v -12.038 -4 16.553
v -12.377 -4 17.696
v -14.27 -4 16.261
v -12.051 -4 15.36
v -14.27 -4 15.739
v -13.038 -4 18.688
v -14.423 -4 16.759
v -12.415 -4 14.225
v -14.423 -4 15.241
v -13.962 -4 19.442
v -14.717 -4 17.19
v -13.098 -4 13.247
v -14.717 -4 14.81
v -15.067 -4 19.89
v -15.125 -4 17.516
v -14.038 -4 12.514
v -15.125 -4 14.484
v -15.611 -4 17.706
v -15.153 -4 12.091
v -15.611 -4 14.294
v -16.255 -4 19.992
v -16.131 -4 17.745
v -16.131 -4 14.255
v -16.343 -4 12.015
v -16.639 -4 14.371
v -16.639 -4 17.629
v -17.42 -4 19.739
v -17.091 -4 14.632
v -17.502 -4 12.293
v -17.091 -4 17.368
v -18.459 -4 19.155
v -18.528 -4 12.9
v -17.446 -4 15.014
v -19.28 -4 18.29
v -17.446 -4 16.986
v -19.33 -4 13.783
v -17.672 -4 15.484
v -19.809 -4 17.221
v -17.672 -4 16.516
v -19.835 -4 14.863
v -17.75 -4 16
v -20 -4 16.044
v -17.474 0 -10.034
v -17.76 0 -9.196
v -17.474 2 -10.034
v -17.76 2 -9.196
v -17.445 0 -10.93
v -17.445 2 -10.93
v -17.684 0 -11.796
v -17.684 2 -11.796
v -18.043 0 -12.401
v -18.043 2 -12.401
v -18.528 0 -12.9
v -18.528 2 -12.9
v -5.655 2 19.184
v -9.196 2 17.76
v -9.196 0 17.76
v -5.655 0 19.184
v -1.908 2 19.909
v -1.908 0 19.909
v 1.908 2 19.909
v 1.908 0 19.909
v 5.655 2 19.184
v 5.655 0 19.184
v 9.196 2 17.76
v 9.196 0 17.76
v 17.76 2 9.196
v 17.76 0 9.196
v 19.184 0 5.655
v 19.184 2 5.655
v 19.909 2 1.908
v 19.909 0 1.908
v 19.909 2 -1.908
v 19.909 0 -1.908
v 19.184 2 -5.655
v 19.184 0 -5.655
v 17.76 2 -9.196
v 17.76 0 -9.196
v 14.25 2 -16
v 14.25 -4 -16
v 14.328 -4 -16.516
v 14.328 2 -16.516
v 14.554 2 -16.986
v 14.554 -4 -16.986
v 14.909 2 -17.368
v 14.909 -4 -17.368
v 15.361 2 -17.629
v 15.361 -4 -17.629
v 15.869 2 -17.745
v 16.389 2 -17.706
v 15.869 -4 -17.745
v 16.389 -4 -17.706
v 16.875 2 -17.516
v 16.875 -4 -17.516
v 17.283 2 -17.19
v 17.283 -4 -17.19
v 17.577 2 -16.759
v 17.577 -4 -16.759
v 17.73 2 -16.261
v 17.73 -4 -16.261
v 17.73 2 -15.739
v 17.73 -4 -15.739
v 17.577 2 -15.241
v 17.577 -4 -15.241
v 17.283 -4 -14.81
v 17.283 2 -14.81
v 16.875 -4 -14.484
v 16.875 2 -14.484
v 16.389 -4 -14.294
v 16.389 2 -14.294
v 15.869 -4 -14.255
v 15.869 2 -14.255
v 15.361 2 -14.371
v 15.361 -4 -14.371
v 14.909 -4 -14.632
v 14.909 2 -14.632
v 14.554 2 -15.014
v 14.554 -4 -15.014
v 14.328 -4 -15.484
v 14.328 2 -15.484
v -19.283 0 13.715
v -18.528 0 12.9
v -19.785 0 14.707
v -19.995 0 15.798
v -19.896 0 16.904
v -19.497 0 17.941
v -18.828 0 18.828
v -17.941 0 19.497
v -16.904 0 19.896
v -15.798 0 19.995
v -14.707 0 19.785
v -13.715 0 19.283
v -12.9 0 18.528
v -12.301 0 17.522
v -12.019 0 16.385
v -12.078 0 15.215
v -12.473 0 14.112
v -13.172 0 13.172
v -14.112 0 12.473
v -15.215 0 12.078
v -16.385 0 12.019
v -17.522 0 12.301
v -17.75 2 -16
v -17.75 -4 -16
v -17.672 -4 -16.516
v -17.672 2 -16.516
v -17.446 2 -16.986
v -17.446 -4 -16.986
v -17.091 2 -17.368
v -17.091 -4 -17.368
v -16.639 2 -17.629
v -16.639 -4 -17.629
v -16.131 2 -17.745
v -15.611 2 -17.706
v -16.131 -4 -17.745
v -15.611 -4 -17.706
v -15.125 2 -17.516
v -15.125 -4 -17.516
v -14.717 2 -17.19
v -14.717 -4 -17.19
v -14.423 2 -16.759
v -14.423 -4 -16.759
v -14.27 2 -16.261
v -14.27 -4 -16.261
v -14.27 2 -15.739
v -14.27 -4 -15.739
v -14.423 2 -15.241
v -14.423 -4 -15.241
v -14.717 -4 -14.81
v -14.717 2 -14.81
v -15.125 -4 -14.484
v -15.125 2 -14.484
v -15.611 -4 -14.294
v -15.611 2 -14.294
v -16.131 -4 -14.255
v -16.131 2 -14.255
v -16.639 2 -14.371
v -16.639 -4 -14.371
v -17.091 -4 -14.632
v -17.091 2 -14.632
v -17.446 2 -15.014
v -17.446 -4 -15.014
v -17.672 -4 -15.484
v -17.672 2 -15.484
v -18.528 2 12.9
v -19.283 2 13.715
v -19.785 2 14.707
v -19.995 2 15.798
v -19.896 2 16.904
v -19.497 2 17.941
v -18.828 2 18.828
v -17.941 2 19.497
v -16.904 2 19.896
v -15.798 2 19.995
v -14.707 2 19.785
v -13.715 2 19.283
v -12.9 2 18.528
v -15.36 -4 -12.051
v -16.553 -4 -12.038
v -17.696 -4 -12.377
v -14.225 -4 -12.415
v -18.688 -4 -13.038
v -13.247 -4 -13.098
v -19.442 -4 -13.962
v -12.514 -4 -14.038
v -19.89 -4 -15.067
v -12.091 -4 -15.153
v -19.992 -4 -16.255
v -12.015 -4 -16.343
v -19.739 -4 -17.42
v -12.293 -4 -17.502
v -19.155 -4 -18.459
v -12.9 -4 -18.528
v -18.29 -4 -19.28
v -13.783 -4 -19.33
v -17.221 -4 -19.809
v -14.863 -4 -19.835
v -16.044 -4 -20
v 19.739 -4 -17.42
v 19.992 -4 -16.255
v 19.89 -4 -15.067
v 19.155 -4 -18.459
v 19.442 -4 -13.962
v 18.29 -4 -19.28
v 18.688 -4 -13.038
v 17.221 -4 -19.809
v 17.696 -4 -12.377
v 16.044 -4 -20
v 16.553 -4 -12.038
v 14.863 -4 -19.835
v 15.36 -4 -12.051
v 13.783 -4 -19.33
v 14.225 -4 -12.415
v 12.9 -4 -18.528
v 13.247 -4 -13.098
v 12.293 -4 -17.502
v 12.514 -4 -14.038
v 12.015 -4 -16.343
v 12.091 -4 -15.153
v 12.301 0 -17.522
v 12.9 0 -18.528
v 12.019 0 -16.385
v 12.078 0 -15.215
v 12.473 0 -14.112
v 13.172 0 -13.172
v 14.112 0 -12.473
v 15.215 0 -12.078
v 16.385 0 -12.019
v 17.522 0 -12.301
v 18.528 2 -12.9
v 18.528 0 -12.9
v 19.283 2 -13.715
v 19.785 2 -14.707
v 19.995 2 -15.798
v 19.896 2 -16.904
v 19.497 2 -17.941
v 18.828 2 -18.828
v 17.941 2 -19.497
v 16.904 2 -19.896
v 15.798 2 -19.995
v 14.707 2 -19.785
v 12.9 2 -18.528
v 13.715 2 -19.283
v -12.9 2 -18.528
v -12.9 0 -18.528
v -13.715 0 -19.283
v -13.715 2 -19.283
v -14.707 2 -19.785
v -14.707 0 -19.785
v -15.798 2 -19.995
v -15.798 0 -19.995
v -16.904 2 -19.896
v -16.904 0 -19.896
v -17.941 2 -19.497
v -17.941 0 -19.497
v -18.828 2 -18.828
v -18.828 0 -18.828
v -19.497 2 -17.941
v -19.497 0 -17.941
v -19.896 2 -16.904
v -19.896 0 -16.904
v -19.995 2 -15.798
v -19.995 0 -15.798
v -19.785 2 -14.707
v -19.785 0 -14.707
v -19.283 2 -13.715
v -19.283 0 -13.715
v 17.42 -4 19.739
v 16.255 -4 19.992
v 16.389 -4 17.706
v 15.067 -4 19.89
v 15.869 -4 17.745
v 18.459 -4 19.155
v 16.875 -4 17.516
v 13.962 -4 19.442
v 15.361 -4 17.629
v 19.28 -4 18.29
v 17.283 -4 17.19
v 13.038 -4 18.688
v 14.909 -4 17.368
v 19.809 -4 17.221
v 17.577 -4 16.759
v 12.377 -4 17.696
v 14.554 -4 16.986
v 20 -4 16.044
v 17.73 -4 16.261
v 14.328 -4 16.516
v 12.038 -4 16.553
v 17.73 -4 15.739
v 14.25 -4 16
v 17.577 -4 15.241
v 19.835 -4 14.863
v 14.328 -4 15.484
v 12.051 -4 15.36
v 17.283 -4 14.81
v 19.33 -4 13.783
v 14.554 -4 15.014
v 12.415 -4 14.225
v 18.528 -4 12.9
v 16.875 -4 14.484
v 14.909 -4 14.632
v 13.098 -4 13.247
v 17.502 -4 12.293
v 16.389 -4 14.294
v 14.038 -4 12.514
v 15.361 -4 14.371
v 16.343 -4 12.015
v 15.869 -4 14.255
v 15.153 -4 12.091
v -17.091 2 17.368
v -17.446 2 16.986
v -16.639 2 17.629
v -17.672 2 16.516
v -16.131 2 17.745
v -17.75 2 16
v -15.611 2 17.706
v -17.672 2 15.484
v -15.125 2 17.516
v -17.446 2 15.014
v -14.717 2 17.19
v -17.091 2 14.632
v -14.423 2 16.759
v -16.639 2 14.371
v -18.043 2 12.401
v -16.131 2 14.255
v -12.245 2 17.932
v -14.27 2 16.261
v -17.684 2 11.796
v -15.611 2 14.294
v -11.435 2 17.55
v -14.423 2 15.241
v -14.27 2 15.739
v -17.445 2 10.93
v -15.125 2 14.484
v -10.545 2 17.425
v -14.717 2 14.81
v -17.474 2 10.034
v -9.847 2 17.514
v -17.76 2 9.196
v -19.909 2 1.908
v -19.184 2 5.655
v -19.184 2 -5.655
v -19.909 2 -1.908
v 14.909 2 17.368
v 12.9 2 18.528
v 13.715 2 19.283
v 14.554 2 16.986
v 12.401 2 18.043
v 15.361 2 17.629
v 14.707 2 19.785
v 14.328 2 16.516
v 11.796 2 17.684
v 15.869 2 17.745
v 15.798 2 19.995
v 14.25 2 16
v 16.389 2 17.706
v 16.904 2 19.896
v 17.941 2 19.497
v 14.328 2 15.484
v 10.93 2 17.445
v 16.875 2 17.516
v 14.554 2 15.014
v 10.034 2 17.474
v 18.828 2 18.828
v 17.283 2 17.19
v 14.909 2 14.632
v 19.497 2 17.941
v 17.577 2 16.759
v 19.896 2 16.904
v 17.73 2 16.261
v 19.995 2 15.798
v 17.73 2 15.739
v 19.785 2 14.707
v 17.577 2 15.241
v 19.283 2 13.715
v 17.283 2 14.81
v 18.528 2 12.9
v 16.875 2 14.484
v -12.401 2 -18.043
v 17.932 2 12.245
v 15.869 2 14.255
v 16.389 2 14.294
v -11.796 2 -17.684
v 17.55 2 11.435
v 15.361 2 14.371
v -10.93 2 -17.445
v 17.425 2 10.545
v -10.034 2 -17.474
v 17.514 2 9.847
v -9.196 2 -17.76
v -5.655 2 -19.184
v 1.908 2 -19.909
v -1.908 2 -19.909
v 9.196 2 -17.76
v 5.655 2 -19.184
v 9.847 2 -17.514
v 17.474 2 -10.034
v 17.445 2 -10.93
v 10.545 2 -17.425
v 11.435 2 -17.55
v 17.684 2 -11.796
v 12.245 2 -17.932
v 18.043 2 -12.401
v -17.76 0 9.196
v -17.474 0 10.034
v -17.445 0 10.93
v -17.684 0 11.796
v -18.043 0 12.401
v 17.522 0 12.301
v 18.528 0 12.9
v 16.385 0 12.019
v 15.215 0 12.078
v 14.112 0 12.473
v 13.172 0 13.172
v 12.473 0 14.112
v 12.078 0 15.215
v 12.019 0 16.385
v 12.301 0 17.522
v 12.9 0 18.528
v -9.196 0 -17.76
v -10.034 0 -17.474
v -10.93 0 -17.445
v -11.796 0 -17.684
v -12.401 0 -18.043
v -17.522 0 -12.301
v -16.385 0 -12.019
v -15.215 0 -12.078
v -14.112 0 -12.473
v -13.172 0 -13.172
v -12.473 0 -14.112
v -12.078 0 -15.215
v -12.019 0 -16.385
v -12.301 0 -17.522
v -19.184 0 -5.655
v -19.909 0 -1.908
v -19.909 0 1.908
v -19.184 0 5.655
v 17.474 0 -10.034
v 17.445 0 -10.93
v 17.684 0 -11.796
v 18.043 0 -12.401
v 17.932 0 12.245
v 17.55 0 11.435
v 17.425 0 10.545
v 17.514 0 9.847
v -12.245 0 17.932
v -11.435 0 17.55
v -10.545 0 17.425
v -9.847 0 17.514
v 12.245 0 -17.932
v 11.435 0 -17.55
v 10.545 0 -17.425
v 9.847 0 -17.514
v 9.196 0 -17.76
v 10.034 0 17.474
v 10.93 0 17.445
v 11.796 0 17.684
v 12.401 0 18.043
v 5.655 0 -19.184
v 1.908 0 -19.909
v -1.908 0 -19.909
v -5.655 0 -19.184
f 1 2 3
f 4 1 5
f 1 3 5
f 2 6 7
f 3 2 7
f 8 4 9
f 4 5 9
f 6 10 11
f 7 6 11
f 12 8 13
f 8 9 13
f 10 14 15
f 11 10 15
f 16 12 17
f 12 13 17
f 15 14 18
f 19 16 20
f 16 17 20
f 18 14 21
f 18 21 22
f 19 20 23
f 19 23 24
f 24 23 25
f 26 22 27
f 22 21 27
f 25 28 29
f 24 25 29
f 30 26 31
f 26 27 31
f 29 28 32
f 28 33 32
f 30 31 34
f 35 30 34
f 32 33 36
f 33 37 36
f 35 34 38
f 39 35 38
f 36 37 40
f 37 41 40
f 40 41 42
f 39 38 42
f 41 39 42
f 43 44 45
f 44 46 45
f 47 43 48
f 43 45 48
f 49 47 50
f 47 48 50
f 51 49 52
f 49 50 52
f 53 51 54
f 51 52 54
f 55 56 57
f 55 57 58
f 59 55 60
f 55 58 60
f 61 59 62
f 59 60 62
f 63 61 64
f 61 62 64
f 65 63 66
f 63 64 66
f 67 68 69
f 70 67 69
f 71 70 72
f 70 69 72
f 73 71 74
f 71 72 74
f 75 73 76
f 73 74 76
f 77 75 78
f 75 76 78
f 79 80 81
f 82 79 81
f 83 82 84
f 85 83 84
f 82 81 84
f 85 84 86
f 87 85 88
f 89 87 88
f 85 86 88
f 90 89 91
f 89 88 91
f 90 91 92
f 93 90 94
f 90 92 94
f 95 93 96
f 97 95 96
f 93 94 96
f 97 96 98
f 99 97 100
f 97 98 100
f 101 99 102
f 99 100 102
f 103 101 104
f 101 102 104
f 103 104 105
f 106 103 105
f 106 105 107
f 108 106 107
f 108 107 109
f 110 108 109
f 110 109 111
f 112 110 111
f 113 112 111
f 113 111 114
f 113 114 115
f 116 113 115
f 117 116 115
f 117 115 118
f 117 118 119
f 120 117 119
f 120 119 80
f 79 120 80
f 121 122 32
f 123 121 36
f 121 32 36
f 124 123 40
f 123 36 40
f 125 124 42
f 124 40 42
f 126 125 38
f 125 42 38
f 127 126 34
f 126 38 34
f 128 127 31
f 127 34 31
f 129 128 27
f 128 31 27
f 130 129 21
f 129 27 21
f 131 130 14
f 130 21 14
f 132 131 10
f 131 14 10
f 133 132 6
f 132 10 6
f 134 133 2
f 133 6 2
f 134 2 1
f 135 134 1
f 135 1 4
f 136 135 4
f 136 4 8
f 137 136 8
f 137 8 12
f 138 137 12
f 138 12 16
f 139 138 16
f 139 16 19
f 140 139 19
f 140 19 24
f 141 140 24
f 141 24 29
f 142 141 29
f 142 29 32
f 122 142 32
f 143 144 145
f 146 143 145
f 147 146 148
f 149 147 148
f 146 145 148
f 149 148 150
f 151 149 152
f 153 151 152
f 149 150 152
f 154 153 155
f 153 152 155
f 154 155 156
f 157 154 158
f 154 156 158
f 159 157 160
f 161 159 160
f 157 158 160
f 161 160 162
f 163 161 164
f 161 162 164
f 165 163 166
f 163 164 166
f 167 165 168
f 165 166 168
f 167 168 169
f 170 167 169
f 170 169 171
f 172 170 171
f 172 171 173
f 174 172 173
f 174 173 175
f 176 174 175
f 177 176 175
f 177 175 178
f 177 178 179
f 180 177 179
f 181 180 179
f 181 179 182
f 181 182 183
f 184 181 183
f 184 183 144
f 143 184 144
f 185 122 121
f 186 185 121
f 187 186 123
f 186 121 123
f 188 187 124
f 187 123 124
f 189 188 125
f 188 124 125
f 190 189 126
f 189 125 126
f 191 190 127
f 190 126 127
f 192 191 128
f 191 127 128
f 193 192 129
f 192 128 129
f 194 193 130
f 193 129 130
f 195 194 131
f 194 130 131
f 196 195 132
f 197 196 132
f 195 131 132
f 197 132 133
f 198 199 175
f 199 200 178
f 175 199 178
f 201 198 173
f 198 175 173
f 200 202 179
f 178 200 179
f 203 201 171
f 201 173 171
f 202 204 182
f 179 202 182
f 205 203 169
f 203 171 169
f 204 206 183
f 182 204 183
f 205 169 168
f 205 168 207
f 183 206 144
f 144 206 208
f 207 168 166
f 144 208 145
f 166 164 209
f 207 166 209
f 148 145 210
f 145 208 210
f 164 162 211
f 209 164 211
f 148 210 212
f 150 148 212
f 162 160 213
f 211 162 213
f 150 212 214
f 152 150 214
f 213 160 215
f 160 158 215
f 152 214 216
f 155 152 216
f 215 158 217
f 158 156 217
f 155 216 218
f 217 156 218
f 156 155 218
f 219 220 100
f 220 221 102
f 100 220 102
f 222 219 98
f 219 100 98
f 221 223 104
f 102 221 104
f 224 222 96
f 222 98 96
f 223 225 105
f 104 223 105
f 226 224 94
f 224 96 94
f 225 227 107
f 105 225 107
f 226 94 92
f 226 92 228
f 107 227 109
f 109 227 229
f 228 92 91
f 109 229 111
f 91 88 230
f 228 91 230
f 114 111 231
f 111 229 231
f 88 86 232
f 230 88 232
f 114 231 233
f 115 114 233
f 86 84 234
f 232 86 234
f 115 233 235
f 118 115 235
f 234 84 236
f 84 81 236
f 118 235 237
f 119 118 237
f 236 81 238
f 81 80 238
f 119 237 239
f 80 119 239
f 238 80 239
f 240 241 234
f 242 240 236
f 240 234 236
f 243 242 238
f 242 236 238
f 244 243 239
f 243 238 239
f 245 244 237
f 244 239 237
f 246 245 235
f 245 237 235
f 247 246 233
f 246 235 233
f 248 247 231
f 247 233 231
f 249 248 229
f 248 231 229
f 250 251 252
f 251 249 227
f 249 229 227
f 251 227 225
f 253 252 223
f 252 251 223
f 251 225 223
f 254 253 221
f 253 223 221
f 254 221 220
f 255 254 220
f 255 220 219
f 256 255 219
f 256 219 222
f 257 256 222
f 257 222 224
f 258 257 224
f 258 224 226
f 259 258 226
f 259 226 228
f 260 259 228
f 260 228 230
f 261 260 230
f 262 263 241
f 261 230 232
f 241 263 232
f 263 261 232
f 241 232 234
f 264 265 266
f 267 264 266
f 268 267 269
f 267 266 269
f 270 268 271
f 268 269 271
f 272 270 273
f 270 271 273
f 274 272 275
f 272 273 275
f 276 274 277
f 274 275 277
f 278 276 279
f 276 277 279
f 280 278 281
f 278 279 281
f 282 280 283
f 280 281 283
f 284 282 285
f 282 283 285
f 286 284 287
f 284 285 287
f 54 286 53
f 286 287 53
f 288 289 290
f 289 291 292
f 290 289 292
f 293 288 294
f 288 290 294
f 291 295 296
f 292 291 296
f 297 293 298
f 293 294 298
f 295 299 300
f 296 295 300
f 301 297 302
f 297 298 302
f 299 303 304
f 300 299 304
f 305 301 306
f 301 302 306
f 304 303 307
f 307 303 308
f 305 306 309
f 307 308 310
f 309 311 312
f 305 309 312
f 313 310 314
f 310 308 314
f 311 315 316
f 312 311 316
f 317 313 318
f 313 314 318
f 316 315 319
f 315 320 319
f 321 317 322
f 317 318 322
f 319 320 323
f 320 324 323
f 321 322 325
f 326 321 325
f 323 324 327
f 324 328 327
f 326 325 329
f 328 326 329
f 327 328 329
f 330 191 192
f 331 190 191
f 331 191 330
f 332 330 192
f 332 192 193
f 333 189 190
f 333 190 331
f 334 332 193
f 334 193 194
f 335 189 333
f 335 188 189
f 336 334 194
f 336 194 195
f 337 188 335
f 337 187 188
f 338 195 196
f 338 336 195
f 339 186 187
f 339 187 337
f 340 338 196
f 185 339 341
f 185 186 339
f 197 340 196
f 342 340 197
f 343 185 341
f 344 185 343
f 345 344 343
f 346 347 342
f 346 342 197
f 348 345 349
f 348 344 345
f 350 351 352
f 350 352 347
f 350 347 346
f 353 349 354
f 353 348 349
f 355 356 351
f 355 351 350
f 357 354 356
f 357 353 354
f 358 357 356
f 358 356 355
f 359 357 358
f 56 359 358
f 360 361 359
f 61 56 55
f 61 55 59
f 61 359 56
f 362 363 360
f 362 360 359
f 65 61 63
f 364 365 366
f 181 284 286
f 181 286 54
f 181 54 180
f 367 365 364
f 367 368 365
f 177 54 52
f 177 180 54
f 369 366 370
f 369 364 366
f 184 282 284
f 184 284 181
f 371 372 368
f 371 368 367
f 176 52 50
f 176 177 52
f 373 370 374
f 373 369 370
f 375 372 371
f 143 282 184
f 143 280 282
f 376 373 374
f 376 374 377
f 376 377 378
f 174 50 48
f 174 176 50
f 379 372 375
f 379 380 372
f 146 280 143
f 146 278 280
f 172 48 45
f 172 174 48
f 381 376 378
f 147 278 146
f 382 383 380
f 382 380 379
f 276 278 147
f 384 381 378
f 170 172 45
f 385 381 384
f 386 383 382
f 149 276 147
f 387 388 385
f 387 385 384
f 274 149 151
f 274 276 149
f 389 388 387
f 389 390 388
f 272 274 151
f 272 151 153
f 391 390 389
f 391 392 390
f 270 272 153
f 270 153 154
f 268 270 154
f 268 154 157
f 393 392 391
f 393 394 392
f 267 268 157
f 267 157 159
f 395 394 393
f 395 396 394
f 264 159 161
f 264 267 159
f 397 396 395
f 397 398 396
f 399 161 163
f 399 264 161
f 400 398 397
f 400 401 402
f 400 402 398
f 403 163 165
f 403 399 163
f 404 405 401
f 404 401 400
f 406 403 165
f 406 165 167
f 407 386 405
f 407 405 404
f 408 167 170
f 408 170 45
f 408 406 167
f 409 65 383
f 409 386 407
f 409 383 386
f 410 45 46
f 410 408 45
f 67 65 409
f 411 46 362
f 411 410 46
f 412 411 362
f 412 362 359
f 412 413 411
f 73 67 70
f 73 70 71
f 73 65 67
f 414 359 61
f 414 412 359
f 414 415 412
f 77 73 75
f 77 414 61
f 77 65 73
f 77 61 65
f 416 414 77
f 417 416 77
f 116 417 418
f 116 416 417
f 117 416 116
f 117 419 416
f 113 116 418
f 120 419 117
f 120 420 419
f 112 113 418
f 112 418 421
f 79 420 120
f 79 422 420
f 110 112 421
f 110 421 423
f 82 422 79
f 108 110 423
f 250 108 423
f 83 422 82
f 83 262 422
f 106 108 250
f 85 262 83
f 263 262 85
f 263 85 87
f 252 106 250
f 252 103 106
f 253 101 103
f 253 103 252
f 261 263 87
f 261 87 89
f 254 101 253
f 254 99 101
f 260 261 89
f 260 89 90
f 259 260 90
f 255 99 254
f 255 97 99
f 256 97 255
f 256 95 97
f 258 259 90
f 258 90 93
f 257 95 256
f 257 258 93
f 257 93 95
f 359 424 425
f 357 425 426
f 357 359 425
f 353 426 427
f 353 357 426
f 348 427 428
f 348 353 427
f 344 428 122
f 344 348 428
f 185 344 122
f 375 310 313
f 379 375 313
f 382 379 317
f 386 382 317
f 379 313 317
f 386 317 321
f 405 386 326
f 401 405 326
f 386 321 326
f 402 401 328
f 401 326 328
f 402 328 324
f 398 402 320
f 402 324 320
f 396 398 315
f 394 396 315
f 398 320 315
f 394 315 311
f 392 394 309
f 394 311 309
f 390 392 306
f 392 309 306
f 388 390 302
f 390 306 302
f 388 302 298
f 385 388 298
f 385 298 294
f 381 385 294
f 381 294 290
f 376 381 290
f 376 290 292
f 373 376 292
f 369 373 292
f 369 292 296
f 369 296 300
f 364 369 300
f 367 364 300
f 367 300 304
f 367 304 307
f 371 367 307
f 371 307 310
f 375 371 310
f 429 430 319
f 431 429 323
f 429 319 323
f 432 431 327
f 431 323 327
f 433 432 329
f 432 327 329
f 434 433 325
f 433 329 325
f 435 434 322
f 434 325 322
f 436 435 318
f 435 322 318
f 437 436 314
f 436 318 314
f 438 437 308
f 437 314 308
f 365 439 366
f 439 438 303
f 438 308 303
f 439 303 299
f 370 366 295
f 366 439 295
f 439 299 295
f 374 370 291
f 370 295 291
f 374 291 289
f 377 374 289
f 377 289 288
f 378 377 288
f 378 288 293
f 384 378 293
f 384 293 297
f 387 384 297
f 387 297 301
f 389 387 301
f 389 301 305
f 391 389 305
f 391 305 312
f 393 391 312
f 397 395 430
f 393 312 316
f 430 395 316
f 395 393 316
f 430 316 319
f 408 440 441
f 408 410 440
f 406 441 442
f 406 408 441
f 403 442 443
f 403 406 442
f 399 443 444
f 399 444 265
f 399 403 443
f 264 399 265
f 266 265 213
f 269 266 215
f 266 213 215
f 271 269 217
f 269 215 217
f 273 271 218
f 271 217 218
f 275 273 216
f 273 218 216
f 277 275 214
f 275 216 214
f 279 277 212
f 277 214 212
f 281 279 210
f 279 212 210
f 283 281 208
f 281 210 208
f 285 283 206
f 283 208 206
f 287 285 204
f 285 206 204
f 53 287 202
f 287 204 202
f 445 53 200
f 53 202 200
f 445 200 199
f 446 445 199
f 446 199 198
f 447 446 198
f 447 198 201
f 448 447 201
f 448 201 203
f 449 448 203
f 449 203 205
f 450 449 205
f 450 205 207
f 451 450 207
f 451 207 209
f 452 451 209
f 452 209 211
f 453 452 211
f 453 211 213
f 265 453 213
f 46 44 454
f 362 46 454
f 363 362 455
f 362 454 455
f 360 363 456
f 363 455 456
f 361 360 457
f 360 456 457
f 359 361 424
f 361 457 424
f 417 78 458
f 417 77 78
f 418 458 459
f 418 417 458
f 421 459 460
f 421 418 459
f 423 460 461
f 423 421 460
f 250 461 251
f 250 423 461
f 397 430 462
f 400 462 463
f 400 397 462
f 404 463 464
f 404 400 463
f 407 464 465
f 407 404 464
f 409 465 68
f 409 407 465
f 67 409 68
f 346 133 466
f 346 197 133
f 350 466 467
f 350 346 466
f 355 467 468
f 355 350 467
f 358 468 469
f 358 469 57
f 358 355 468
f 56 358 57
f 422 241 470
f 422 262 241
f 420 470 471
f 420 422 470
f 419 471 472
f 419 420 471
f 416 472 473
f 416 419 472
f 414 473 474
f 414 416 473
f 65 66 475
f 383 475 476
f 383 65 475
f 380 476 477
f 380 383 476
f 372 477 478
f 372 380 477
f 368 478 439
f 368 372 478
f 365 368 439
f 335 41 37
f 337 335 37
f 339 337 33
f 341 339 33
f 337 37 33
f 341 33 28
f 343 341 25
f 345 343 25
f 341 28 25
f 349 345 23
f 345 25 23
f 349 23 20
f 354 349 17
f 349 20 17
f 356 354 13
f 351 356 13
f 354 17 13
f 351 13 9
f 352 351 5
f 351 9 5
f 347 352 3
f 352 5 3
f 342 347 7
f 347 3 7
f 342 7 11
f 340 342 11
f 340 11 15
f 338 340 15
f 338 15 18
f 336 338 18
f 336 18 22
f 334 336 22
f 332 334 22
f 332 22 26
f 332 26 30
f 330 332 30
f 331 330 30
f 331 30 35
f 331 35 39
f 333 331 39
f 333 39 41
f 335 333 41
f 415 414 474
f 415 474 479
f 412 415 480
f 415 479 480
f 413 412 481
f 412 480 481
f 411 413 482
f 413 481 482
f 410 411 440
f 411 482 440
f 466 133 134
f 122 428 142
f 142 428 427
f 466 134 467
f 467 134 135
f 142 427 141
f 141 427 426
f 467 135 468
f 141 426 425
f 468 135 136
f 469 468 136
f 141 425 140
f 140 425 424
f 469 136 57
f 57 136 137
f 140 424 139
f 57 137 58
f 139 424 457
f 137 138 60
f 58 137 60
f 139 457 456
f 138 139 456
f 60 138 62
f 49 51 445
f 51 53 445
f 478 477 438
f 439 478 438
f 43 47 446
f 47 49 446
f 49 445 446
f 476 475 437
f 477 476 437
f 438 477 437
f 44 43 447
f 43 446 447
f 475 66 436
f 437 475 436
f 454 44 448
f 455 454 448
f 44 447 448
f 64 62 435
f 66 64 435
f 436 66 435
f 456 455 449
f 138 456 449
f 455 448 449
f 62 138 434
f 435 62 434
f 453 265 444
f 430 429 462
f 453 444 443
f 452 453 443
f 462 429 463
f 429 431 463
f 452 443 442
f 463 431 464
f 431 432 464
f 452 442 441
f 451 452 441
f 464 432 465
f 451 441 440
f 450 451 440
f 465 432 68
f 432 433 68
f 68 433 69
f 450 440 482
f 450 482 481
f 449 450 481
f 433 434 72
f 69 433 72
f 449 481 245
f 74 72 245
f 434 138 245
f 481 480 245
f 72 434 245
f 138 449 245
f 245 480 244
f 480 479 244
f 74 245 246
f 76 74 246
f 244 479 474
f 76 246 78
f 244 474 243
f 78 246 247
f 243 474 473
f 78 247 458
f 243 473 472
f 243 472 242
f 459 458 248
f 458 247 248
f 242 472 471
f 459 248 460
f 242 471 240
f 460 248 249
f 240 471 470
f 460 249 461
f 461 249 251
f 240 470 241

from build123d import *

# Parameters (mm, degrees)
BOSS_EXTRUDE1_DEPTH        = 2
FILLET1_R                  = 3
BOSS_EXTRUDE2_START        = -4
SKETCH1_3_R                = 4
BOSS_EXTRUDE2_DEPTH        = 4
F_3_5_3_5_DIAMETER_HOLE1_D = 3.5


with BuildPart() as part:
    # Sketch1 → Boss-Extrude1 (new body)
    with BuildSketch(Plane(origin=(0, 0, 0), x_dir=(1, 0, 0), z_dir=(0, 1, 0))):
        with BuildLine():
            ThreePointArc((16, -12), (20, 0), (16, 12))
            ThreePointArc((16, 12), (18.828427125, 18.828427125), (12, 16))
            ThreePointArc((12, 16), (0, 20), (-12, 16))
            ThreePointArc((-12, 16), (-18.828427125, 18.828427125), (-16, 12))
            ThreePointArc((-16, 12), (-20, 0), (-16, -12))
            ThreePointArc((-16, -12), (-18.828427125, -18.828427125), (-12, -16))
            ThreePointArc((-12, -16), (0, -20), (12, -16))
            ThreePointArc((12, -16), (18.828427125, -18.828427125), (16, -12))
        make_face()
    extrude(amount=BOSS_EXTRUDE1_DEPTH)

    # Fillet1
    fillet1_edges = [part.edges().sort_by_distance(p)[0] for p in [
        (-16, 1, 12),
        (-16, 1, -12),
        (12, 1, -16),
        (16, 1, -12),
        (16, 1, 12),
        (12, 1, 16),
        (-12, 1, 16),
        (-12, 1, -16),
    ]]
    fillet(fillet1_edges, radius=FILLET1_R)

    # Sketch1<3> → Boss-Extrude2 (add)
    with BuildSketch(Plane(origin=(0, 0, 0), x_dir=(1, 0, 0), z_dir=(0, 1, 0)).offset(BOSS_EXTRUDE2_START)):
        with Locations((-16, 16)):
            Circle(SKETCH1_3_R)
        with Locations((16, 16)):
            Circle(SKETCH1_3_R)
        with Locations((16, -16)):
            Circle(SKETCH1_3_R)
        with Locations((-16, -16)):
            Circle(SKETCH1_3_R)
    extrude(amount=BOSS_EXTRUDE2_DEPTH)

    # Ø3.5 (3.5) Diameter Hole1 (through all)
    with Locations(Plane(origin=(0, 2, 0), x_dir=(1, 0, 0), z_dir=(0, 1, 0))):
        with Locations((-16, 16), (16, 16), (16, -16), (-16, -16)):
            Hole(F_3_5_3_5_DIAMETER_HOLE1_D / 2)


solid = part.part
